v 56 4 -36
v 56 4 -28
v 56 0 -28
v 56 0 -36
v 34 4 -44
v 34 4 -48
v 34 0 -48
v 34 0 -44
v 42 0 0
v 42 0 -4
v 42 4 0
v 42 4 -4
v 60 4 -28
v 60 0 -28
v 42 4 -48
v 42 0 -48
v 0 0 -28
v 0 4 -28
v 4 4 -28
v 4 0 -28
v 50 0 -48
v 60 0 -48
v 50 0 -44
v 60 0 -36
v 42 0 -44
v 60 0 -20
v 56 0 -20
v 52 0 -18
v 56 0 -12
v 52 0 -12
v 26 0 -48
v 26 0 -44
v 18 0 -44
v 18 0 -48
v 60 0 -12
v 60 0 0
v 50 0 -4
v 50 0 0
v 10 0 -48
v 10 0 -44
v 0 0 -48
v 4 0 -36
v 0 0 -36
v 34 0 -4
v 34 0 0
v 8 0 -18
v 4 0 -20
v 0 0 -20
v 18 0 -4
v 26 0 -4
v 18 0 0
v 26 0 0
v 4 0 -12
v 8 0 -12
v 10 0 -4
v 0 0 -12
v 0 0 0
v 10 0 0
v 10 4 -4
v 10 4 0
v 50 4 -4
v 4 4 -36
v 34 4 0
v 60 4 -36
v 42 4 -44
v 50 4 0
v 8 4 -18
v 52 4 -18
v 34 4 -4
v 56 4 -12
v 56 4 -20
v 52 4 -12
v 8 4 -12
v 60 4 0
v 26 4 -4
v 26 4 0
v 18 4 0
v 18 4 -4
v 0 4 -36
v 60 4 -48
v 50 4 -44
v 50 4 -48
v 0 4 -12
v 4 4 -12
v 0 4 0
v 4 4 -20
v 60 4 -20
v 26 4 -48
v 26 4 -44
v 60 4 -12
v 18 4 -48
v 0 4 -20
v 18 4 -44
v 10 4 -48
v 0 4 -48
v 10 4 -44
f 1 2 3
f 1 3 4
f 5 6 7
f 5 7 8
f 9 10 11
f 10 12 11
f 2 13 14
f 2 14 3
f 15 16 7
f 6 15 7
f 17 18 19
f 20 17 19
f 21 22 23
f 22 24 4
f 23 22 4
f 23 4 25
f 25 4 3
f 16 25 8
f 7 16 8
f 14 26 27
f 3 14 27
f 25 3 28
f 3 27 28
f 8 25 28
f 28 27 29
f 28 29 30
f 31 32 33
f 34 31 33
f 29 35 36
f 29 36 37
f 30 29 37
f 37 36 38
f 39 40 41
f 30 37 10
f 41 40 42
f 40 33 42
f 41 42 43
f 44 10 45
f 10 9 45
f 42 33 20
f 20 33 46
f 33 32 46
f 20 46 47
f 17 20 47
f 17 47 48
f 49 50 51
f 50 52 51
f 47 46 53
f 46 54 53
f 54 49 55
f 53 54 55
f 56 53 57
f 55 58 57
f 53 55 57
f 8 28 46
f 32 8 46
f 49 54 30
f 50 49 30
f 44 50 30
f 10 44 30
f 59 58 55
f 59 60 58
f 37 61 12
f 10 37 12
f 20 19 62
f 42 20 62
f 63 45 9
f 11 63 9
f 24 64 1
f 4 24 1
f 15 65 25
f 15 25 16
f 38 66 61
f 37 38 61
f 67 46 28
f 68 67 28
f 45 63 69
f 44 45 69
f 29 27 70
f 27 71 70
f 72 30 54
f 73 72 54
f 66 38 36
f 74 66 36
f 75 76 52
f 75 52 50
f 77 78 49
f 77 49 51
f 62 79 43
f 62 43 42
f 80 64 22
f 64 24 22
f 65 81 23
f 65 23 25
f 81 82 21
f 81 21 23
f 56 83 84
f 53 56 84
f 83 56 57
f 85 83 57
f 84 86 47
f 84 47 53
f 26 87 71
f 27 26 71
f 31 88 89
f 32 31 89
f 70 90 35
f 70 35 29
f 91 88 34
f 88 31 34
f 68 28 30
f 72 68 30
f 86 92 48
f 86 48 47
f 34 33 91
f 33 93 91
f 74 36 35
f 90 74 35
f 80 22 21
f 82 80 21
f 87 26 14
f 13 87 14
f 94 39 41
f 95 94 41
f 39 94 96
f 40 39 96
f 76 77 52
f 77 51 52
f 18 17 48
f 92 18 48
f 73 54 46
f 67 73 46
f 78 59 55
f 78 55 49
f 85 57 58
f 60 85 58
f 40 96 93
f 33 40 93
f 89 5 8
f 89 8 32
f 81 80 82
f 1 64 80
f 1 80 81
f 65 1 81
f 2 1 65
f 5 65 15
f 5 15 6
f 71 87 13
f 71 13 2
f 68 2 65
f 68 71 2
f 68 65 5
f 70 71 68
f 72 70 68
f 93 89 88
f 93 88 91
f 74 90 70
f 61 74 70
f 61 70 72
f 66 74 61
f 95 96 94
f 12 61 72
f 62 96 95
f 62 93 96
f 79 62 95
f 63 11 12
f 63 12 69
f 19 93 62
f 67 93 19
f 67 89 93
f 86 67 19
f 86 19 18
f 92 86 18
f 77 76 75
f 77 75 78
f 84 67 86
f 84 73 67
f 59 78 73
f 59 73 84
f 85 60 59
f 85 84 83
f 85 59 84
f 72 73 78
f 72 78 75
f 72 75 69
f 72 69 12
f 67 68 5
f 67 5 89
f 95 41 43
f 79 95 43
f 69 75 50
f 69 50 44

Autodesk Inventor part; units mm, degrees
ref_plane "YZ Plane" through (0, 0, 0) normal (1, 0, 0) x (0, 1, 0)
ref_plane "XZ Plane" through (0, 0, 0) normal (0, 1, 0) x (-1, 0, 0)
ref_plane "XY Plane" through (0, 0, 0) normal (0, 0, 1) x (1, 0, 0)
sketch "Sketch1" plane through (0, 0, 0) normal (0, 1, 0) x (-1, 0, 0)
  line L0 (0, 0) -> (-60, 0)
  line L1 (-60, 0) -> (-60, -48)
  line L2 (-60, -48) -> (0, -48)
  line L3 (0, -48) -> (0, 0)
  line L4 (-8, -18) -> (-52, -18)
  line L5 (-52, -18) -> (-52, -12)
  line L6 (-52, -12) -> (-8, -12)
  line L7 (-8, -12) -> (-8, -18)
  dimension "d0" = 60
  dimension "d1" = 48
  dimension "d14" = 44
  dimension "d15" = 6
  dimension "d16" = 8
  dimension "d17" = 12
extrude "Extrusion1" add sketch "Sketch1" along normal blind 4
sketch "Sketch2" plane through (0, 4, 0) normal (0, 1, 0) x (1, 0, 0)
  line L0 (0, 0) -> (60, 0) construction
  line L1 (60, 0) -> (60, 48) construction
  line L2 (60, 48) -> (0, 48) construction
  line L3 (0, 48) -> (0, 0) construction
  line L4 (4, 44) -> (56, 44) construction
  line L5 (56, 44) -> (56, 4) construction
  line L6 (56, 4) -> (4, 4) construction
  line L7 (4, 4) -> (4, 44) construction
  line L8 (60, 48) -> (0, 48) construction
  line L9 (30, 48) -> (30, 0) construction
  line L10 (0, 0) -> (60, 0) construction
  line L11 (0, 48) -> (0, 0) construction
  line L12 (0, 24) -> (60, 24) construction
  line L13 (60, 0) -> (60, 48) construction
  line L14 (0, 28) -> (4, 28)
  line L15 (0, 36) -> (4, 36)
  line L16 (10, 48) -> (10, 44)
  line L17 (10, 44) -> (18, 44)
  line L18 (18, 44) -> (18, 48)
  line L19 (18, 48) -> (10, 48)
  line L20 (26, 48) -> (26, 44)
  line L21 (26, 44) -> (30, 44)
  line L22 (26, 48) -> (30, 48)
  line L23 (0, 36) -> (0, 28)
  line L24 (4, 28) -> (4, 36)
  line L25 (60, 28) -> (56, 28)
  line L26 (60, 36) -> (56, 36)
  line L27 (50, 48) -> (50, 44)
  line L28 (50, 44) -> (42, 44)
  line L29 (42, 44) -> (42, 48)
  line L30 (42, 48) -> (50, 48)
  line L31 (34, 48) -> (34, 44)
  line L32 (34, 44) -> (30, 44)
  line L33 (34, 48) -> (30, 48)
  line L34 (60, 36) -> (60, 28)
  line L35 (56, 28) -> (56, 36)
  line L36 (60, 0) -> (0, 0) construction
  line L37 (4, 4) -> (56, 4) construction
  line L38 (60, 0) -> (0, 0) construction
  line L39 (0, 20) -> (4, 20)
  line L40 (0, 12) -> (4, 12)
  line L41 (10, 0) -> (10, 4)
  line L42 (10, 4) -> (18, 4)
  line L43 (18, 4) -> (18, 0)
  line L44 (18, 0) -> (10, 0)
  line L45 (26, 0) -> (26, 4)
  line L46 (26, 4) -> (30, 4)
  line L47 (26, 0) -> (30, 0)
  line L48 (0, 12) -> (0, 20)
  line L49 (4, 20) -> (4, 12)
  line L50 (34, 0) -> (34, 4)
  line L51 (34, 4) -> (30, 4)
  line L52 (34, 0) -> (30, 0)
  line L53 (42, 4) -> (42, 0)
  line L54 (50, 4) -> (42, 4)
  line L55 (42, 0) -> (50, 0)
  line L56 (50, 0) -> (50, 4)
  line L57 (56, 20) -> (56, 12)
  line L58 (60, 12) -> (56, 12)
  line L59 (60, 12) -> (60, 20)
  line L60 (60, 20) -> (56, 20)
  dimension "d4" = 4
  dimension "d7" = 8
  dimension "d8" = 8
  dimension "d9" = 4
  dimension "d10" = 8
  dimension "d11" = 4
extrude "Extrusion2" cut sketch "Sketch2" against normal up to surface (4 mm away)
properties part number "left" material "PBT Plastic Black"
